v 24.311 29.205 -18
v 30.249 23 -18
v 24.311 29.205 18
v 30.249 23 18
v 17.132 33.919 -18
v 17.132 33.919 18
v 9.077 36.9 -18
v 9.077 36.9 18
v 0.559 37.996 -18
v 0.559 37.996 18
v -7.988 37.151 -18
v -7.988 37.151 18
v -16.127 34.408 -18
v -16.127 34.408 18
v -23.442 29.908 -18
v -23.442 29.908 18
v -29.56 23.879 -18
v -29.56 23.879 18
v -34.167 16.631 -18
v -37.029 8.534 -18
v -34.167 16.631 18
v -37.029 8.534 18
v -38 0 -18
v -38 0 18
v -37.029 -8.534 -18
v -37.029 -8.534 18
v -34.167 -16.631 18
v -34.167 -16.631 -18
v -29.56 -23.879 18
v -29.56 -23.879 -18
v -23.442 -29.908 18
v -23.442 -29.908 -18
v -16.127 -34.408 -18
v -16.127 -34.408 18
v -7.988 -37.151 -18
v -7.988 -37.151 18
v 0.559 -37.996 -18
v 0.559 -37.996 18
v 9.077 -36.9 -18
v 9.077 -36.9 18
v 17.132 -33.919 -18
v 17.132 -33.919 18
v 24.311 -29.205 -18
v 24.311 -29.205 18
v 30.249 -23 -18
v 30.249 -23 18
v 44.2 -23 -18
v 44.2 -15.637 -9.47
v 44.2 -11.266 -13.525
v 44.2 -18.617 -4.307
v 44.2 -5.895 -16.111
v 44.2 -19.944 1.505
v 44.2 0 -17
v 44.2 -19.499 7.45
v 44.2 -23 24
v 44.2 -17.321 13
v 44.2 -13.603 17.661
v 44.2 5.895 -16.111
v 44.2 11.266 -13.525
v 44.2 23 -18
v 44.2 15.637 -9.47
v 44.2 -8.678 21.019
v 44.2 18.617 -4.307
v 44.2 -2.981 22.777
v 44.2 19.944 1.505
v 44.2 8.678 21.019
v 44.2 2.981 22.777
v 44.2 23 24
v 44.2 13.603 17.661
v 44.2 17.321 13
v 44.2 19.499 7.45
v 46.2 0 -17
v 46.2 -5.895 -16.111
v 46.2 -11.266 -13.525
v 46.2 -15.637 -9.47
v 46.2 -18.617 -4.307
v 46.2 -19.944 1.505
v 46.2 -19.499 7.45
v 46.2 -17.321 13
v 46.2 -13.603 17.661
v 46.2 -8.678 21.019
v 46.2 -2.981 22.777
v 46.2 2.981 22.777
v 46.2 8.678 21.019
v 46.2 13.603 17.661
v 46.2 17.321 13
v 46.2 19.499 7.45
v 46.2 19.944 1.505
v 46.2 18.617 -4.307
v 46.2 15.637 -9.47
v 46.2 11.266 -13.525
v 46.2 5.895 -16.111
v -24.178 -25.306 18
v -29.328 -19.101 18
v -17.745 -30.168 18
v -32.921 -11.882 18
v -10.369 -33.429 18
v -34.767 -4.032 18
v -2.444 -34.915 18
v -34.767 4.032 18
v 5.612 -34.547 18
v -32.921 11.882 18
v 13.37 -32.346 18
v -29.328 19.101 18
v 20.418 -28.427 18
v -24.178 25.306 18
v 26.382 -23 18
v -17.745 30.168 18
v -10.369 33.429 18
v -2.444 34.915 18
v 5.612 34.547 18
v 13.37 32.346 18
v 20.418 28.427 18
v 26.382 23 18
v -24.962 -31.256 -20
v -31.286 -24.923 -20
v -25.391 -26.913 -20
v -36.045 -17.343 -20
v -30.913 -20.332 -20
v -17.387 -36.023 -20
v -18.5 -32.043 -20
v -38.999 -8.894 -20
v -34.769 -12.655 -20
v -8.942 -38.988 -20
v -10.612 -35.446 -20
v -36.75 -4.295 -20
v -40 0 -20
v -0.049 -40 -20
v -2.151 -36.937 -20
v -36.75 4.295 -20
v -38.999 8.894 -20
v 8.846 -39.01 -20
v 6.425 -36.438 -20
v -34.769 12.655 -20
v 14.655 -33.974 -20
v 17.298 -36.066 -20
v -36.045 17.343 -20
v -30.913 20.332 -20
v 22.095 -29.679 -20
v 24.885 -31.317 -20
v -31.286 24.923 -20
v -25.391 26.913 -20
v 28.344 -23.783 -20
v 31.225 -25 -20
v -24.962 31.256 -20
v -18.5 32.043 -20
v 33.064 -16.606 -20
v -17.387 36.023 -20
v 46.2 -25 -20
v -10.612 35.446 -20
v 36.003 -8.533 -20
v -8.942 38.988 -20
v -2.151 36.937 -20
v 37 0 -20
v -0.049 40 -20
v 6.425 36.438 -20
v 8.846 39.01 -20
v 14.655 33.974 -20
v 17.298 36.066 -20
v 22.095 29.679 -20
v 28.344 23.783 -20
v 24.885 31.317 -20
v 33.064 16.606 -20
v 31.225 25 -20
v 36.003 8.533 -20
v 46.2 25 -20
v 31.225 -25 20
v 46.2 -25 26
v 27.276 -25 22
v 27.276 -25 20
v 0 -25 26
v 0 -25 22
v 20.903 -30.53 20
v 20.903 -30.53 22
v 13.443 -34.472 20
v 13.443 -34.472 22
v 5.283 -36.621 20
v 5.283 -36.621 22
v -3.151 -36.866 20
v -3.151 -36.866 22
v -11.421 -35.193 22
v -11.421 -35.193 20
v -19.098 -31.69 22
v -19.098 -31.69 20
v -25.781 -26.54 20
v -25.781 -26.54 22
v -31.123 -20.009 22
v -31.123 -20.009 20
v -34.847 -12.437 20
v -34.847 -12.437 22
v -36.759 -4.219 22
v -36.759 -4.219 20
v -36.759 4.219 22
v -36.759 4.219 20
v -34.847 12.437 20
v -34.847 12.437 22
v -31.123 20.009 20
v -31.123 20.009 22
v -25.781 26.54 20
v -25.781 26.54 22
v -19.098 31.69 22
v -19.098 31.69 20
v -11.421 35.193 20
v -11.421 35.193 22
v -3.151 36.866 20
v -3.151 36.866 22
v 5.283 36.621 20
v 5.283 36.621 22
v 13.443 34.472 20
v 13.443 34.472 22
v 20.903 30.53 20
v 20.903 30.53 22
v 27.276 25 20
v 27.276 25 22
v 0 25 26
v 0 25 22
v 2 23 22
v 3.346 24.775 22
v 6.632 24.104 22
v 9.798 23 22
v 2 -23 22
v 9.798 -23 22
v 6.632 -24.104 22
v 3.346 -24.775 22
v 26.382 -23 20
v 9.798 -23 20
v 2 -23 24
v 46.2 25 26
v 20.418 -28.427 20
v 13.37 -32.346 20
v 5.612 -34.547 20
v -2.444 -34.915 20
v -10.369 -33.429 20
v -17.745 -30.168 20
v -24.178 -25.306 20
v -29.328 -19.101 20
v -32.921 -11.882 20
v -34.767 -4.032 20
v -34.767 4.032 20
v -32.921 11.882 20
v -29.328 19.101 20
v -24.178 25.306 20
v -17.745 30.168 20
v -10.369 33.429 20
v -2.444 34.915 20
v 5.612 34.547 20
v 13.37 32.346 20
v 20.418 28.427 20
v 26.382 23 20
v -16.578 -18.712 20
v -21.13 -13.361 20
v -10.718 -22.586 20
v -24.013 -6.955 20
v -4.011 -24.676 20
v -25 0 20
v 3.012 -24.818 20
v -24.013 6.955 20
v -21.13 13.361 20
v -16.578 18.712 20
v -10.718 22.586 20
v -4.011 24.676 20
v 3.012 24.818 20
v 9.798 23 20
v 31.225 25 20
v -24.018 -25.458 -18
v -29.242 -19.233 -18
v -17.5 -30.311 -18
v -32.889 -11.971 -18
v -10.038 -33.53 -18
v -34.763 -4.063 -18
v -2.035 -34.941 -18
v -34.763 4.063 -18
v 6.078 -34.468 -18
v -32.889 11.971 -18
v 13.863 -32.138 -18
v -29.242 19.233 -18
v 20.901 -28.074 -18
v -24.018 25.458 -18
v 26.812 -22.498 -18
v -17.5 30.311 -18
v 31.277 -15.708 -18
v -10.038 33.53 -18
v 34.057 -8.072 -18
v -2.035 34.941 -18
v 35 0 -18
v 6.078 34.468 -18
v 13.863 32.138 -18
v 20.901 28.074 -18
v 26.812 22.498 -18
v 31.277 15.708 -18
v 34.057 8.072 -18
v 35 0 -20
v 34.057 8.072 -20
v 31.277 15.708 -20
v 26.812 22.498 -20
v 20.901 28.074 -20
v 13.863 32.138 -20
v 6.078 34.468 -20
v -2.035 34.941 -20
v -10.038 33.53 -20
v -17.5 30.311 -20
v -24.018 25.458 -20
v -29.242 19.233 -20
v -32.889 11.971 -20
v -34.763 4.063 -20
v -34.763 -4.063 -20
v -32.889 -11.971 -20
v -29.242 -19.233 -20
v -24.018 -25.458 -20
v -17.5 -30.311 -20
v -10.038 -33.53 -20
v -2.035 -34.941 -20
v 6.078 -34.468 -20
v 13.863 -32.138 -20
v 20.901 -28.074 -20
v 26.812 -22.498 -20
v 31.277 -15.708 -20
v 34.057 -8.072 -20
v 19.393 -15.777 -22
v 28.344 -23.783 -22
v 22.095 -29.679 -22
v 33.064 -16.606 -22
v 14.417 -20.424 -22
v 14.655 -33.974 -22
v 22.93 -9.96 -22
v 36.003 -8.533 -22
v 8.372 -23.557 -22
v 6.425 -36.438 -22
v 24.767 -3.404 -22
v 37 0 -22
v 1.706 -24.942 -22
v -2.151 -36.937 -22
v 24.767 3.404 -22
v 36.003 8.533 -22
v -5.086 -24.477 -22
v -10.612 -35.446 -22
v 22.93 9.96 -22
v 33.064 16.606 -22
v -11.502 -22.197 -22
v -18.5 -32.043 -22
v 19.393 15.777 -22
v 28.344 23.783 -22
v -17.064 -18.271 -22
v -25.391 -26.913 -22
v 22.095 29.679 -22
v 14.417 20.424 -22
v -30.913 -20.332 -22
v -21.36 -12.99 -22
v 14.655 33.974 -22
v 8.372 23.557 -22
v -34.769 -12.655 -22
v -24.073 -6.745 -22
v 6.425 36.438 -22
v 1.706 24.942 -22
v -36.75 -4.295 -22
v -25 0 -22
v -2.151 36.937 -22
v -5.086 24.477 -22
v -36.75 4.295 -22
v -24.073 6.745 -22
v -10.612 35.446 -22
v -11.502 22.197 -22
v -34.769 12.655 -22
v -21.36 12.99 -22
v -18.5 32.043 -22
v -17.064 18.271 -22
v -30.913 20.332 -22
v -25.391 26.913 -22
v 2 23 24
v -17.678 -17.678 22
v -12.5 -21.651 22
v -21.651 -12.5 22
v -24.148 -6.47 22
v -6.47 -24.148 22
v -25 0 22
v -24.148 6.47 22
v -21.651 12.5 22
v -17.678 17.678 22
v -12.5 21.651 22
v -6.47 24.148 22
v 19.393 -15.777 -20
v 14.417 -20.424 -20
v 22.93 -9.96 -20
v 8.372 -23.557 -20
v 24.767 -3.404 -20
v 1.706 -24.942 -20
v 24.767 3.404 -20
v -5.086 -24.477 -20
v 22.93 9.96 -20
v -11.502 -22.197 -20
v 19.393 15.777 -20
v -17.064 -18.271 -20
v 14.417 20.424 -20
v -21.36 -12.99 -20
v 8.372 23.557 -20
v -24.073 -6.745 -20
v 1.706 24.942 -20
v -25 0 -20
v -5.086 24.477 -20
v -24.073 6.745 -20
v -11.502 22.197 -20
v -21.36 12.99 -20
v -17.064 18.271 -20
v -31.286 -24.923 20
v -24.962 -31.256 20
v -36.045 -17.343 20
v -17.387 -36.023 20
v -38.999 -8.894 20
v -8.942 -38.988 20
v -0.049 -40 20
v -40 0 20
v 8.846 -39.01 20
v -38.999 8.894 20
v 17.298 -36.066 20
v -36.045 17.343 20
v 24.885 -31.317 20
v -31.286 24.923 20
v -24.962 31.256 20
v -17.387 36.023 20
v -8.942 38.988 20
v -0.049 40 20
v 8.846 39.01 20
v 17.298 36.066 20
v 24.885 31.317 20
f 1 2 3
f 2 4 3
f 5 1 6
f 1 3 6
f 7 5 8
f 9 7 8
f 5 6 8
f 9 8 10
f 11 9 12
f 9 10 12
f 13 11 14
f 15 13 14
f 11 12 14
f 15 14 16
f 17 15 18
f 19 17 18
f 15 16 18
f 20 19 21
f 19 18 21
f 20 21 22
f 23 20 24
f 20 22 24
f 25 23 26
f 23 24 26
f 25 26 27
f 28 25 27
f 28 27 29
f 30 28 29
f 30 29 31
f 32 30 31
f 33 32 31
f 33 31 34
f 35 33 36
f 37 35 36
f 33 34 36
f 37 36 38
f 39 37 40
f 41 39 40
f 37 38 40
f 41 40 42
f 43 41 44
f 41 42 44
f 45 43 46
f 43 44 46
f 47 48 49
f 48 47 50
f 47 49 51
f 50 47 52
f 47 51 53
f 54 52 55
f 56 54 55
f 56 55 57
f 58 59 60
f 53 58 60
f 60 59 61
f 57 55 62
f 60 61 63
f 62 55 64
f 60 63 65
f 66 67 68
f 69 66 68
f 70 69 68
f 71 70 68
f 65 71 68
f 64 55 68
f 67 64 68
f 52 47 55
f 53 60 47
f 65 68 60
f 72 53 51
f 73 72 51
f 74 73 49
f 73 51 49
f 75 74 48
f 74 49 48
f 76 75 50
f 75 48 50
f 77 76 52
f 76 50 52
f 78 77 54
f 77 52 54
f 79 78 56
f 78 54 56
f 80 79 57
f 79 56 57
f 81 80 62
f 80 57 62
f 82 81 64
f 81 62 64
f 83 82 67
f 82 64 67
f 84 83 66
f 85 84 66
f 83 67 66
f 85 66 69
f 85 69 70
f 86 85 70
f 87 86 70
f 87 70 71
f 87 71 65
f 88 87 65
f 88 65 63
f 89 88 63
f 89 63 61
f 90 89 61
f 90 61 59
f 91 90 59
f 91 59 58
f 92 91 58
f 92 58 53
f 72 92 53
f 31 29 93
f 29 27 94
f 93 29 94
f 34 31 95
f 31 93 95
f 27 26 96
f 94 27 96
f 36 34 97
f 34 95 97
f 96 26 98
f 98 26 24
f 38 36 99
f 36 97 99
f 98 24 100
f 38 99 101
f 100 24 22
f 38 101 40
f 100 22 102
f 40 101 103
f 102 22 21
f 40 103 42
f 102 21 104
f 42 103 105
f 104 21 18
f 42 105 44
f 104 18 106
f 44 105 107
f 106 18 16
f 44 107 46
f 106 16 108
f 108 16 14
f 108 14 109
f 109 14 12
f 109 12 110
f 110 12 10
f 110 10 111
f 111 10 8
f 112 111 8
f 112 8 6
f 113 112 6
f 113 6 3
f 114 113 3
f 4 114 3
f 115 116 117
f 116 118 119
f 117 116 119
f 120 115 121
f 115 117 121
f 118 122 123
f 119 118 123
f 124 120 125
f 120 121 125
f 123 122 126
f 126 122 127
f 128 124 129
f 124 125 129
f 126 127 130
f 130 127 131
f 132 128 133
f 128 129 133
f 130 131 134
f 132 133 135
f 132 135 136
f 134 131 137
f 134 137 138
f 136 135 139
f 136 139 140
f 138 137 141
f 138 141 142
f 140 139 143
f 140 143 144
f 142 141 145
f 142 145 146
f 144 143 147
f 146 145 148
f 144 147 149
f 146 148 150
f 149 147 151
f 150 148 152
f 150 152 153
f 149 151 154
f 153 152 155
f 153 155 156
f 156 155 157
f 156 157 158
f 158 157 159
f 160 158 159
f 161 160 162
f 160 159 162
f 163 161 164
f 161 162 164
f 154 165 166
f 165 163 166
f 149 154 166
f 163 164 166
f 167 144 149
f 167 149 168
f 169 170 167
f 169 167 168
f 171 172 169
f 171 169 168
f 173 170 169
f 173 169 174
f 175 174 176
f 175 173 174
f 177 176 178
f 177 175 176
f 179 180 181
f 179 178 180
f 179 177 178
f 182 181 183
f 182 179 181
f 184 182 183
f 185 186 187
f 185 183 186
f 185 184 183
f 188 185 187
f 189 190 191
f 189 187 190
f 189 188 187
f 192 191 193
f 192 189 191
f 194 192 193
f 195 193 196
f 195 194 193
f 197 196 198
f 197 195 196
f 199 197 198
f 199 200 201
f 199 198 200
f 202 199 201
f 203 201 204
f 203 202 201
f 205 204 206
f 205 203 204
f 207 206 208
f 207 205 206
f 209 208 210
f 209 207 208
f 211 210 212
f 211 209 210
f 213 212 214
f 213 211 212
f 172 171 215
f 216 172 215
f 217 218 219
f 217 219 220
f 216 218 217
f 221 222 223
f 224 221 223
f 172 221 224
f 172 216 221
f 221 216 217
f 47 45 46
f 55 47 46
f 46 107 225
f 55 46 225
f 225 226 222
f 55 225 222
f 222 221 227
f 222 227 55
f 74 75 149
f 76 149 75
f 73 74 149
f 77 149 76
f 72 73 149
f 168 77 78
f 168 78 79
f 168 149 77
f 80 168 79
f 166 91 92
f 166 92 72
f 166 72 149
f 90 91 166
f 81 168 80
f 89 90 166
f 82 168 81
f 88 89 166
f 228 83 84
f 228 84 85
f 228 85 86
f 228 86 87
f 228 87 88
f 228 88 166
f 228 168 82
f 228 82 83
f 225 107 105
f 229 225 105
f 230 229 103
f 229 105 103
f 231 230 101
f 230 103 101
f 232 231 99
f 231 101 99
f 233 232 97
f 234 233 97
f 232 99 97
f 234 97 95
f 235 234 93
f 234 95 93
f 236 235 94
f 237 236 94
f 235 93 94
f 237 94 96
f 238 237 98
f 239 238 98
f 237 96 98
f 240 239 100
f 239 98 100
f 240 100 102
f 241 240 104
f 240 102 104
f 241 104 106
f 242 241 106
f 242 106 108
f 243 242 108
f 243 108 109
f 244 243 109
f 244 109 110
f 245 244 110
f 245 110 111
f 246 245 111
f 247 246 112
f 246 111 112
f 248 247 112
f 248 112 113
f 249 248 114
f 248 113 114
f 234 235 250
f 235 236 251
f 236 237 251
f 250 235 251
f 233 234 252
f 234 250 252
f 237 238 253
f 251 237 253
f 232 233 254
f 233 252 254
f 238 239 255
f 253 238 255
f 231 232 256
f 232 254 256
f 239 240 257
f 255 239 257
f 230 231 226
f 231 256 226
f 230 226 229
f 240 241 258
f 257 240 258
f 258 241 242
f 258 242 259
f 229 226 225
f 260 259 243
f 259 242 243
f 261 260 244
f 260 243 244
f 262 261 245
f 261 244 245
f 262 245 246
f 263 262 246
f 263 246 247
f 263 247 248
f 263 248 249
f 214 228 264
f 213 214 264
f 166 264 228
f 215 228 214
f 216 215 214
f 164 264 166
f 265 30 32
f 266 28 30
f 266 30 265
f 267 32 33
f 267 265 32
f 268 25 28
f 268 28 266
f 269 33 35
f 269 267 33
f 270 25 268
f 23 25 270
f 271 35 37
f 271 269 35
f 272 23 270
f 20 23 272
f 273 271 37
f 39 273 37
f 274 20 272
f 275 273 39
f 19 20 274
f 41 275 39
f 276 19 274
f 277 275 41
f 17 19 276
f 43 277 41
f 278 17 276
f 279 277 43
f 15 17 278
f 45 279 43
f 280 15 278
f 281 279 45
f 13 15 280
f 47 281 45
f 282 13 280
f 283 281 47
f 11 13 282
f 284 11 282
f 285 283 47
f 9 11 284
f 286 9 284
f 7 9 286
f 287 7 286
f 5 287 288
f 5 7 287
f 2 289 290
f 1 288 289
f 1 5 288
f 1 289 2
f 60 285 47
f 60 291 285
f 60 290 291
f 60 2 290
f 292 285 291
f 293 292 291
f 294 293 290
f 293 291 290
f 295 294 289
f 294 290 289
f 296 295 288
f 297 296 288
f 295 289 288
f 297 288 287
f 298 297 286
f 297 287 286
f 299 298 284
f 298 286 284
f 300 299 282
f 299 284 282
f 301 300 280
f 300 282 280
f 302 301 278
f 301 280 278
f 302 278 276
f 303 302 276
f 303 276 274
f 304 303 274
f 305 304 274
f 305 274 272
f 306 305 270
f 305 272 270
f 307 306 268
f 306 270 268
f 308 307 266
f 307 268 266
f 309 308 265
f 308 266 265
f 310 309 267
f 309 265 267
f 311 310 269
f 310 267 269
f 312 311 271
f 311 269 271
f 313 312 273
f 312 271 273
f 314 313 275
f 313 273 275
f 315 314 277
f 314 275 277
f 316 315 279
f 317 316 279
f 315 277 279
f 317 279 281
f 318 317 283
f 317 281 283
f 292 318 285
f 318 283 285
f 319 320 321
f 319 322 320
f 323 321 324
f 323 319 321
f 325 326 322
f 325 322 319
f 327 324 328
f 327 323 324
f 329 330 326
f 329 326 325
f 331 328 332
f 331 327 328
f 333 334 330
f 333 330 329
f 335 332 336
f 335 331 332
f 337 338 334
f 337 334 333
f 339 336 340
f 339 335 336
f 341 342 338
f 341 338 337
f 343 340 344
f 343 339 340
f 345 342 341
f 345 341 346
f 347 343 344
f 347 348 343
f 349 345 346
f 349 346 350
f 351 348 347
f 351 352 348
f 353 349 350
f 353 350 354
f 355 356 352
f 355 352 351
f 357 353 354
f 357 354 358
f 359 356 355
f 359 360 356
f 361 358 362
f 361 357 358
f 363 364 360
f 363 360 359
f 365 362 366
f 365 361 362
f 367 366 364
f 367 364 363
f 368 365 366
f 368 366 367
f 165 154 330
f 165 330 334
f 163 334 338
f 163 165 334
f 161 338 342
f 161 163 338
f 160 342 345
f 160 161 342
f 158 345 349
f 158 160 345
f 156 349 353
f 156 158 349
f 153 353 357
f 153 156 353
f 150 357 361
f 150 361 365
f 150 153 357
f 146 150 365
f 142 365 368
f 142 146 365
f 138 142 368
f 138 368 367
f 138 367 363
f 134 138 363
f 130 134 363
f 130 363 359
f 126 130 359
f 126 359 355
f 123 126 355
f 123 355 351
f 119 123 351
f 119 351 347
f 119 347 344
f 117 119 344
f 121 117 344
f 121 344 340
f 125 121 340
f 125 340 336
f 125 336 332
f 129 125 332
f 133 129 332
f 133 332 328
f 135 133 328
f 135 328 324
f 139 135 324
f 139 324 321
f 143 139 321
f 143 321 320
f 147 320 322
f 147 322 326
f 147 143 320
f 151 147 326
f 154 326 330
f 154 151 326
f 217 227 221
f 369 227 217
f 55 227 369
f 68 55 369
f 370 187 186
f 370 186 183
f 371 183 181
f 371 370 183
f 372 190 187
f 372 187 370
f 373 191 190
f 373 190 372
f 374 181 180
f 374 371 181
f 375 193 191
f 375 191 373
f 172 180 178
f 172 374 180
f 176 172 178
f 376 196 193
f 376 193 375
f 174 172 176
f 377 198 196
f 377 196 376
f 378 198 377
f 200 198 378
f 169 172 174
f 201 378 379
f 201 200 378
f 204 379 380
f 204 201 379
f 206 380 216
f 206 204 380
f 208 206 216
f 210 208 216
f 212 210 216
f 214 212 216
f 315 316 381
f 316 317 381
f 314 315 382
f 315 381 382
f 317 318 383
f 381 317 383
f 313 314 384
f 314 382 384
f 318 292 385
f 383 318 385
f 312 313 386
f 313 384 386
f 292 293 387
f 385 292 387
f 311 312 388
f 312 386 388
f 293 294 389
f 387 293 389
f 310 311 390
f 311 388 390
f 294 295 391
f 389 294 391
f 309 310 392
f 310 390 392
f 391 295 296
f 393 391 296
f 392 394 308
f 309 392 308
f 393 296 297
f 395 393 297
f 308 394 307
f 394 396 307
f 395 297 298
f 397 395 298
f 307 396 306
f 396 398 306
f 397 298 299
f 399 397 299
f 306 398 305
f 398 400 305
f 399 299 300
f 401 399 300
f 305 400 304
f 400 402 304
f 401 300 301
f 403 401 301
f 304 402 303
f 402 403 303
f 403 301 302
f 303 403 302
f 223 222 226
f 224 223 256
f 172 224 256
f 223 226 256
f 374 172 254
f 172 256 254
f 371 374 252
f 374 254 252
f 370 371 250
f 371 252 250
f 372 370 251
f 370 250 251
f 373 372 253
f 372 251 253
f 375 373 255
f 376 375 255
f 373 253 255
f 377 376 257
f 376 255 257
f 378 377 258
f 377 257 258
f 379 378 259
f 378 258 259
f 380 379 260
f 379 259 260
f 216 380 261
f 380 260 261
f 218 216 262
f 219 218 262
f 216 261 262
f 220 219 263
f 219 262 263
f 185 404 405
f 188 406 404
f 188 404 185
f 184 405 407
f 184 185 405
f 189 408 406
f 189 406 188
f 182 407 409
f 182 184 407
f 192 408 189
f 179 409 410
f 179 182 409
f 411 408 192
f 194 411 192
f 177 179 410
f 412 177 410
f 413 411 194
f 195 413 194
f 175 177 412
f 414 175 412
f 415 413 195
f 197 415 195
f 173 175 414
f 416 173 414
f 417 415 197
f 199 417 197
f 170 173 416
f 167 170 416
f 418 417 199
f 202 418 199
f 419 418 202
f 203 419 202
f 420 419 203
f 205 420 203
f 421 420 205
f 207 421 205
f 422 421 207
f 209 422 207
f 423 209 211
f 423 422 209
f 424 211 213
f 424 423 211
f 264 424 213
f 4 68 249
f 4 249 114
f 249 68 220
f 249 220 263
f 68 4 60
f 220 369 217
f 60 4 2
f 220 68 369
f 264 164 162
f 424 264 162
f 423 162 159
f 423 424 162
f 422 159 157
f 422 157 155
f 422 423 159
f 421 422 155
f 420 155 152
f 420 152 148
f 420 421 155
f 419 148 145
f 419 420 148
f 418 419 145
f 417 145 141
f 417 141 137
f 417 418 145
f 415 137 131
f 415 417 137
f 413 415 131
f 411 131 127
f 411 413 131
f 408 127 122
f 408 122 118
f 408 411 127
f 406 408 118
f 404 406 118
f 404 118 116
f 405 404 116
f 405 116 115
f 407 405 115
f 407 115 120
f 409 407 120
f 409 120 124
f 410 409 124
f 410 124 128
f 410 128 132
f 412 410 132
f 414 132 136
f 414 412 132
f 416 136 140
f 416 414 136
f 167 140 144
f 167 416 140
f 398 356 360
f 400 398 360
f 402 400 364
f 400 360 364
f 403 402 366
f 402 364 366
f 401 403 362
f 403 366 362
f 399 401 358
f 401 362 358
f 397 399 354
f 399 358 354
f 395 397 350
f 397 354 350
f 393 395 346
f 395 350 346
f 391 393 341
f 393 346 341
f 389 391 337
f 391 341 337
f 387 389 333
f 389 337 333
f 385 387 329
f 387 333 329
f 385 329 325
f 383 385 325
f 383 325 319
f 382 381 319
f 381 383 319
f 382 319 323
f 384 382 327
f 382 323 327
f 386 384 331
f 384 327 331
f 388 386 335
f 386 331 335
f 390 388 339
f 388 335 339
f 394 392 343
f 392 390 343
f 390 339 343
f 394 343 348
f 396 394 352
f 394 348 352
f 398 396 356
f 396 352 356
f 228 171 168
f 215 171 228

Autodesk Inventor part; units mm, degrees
ref_plane "YZ Plane" through (0, 0, 0) normal (1, 0, 0) x (0, 1, 0)
ref_plane "XZ Plane" through (0, 0, 0) normal (0, 1, 0) x (-1, 0, 0)
sketch "ｽｹｯﾁ1" plane through (0, 0, 0) normal (0, 0, 1) x (1, 0, 0)
  circle A0 centre (0, 0) radius 40
  dimension "d0" = 80
extrude "押し出し1" add sketch "ｽｹｯﾁ1" along normal mid plane 40
sketch "ｽｹｯﾁ2" plane through (0, 0, 20) normal (0, 0, 1) x (1, 0, 0)
  circle A0 centre (0, 0) radius 40 projected
  circle A1 centre (0, 0) radius 37
  dimension "d3" = 3
extrude "押し出し2" add sketch "ｽｹｯﾁ2" along normal blind 2 contours A1
mirror "Mirror1" about plane through (0, 0, 0) normal (0, 0, 1) of "押し出し2"
ref_plane "作業平面1" through (0, 0, 0) normal (1, 0, 0) x (0, 1, 0)
sketch "ｽｹｯﾁ3" plane through (0, 0, 0) normal (1, 0, 0) x (0, 1, 0)
  line L0 (-37, -22) -> (37, -22) projected
  line L1 (40, -20) -> (-40, -20) projected
  line L2 (-25, 26) -> (25, 26)
  line L3 (25, 26) -> (25, -20)
  line L4 (25, -20) -> (-25, -20)
  line L5 (-25, -20) -> (-25, 26)
  line L6 (-25, 3) -> (25, 3)
  line L7 (0, 26) -> (0, -20)
  line L8 (0, -20) -> (0, 24.715)
  dimension "d6" = 50
  dimension "d7" = 46
  dimension "d8" = 25
extrude "押し出し3" add sketch "ｽｹｯﾁ3" along normal blind 46.2
sketch "Sketch4" plane through (46.2, 0, 0) normal (1, 0, 0) x (0, 0, -1)
  point P0 (0, 0)
ref_plane "Work Plane2" through (46.2, 0, -20) normal (0, -1, 0) x (1, 0, 0)
ref_plane "Work Plane3" through (46.2, 25, 3) normal (0, 0, -1) x (-1, 0, 0)
shell "Shell1" thickness 2 removed faces 0
sketch "Sketch7" plane through (0, 0, 22) normal (0, 0, 1) x (1, 0, 0)
  circle A0 centre (0, 0) radius 37 projected
hole "Hole1" at (0, 0, 22) direction (0, 0, -1) diameter 50 end through all
sketch "Sketch8" plane through (46.2, 0, 0) normal (1, 0, 0) x (0, 0, -1)
  point P0 (-3, 0)
hole "Hole2" at (46.2, 0, 3) direction (-1, 0, 0) diameter 40 depth 2 tip angle 118
sketch "Sketch9" plane through (0, 0, -22) normal (0, 0, -1) x (-1, 0, 0)
  circle A0 centre (0, 0) radius 25
extrude "Extrusion7" add sketch "Sketch9" against normal blind 10
sketch "Sketch10" plane through (0, 0, -22) normal (0, 0, -1) x (-1, 0, 0)
  circle A0 centre (0, 0) radius 25 projected
  circle A1 centre (0, 0) radius 25
extrude "Extrusion8" cut sketch "Sketch10" against normal blind 10
properties part number "Robot-Axis5"
